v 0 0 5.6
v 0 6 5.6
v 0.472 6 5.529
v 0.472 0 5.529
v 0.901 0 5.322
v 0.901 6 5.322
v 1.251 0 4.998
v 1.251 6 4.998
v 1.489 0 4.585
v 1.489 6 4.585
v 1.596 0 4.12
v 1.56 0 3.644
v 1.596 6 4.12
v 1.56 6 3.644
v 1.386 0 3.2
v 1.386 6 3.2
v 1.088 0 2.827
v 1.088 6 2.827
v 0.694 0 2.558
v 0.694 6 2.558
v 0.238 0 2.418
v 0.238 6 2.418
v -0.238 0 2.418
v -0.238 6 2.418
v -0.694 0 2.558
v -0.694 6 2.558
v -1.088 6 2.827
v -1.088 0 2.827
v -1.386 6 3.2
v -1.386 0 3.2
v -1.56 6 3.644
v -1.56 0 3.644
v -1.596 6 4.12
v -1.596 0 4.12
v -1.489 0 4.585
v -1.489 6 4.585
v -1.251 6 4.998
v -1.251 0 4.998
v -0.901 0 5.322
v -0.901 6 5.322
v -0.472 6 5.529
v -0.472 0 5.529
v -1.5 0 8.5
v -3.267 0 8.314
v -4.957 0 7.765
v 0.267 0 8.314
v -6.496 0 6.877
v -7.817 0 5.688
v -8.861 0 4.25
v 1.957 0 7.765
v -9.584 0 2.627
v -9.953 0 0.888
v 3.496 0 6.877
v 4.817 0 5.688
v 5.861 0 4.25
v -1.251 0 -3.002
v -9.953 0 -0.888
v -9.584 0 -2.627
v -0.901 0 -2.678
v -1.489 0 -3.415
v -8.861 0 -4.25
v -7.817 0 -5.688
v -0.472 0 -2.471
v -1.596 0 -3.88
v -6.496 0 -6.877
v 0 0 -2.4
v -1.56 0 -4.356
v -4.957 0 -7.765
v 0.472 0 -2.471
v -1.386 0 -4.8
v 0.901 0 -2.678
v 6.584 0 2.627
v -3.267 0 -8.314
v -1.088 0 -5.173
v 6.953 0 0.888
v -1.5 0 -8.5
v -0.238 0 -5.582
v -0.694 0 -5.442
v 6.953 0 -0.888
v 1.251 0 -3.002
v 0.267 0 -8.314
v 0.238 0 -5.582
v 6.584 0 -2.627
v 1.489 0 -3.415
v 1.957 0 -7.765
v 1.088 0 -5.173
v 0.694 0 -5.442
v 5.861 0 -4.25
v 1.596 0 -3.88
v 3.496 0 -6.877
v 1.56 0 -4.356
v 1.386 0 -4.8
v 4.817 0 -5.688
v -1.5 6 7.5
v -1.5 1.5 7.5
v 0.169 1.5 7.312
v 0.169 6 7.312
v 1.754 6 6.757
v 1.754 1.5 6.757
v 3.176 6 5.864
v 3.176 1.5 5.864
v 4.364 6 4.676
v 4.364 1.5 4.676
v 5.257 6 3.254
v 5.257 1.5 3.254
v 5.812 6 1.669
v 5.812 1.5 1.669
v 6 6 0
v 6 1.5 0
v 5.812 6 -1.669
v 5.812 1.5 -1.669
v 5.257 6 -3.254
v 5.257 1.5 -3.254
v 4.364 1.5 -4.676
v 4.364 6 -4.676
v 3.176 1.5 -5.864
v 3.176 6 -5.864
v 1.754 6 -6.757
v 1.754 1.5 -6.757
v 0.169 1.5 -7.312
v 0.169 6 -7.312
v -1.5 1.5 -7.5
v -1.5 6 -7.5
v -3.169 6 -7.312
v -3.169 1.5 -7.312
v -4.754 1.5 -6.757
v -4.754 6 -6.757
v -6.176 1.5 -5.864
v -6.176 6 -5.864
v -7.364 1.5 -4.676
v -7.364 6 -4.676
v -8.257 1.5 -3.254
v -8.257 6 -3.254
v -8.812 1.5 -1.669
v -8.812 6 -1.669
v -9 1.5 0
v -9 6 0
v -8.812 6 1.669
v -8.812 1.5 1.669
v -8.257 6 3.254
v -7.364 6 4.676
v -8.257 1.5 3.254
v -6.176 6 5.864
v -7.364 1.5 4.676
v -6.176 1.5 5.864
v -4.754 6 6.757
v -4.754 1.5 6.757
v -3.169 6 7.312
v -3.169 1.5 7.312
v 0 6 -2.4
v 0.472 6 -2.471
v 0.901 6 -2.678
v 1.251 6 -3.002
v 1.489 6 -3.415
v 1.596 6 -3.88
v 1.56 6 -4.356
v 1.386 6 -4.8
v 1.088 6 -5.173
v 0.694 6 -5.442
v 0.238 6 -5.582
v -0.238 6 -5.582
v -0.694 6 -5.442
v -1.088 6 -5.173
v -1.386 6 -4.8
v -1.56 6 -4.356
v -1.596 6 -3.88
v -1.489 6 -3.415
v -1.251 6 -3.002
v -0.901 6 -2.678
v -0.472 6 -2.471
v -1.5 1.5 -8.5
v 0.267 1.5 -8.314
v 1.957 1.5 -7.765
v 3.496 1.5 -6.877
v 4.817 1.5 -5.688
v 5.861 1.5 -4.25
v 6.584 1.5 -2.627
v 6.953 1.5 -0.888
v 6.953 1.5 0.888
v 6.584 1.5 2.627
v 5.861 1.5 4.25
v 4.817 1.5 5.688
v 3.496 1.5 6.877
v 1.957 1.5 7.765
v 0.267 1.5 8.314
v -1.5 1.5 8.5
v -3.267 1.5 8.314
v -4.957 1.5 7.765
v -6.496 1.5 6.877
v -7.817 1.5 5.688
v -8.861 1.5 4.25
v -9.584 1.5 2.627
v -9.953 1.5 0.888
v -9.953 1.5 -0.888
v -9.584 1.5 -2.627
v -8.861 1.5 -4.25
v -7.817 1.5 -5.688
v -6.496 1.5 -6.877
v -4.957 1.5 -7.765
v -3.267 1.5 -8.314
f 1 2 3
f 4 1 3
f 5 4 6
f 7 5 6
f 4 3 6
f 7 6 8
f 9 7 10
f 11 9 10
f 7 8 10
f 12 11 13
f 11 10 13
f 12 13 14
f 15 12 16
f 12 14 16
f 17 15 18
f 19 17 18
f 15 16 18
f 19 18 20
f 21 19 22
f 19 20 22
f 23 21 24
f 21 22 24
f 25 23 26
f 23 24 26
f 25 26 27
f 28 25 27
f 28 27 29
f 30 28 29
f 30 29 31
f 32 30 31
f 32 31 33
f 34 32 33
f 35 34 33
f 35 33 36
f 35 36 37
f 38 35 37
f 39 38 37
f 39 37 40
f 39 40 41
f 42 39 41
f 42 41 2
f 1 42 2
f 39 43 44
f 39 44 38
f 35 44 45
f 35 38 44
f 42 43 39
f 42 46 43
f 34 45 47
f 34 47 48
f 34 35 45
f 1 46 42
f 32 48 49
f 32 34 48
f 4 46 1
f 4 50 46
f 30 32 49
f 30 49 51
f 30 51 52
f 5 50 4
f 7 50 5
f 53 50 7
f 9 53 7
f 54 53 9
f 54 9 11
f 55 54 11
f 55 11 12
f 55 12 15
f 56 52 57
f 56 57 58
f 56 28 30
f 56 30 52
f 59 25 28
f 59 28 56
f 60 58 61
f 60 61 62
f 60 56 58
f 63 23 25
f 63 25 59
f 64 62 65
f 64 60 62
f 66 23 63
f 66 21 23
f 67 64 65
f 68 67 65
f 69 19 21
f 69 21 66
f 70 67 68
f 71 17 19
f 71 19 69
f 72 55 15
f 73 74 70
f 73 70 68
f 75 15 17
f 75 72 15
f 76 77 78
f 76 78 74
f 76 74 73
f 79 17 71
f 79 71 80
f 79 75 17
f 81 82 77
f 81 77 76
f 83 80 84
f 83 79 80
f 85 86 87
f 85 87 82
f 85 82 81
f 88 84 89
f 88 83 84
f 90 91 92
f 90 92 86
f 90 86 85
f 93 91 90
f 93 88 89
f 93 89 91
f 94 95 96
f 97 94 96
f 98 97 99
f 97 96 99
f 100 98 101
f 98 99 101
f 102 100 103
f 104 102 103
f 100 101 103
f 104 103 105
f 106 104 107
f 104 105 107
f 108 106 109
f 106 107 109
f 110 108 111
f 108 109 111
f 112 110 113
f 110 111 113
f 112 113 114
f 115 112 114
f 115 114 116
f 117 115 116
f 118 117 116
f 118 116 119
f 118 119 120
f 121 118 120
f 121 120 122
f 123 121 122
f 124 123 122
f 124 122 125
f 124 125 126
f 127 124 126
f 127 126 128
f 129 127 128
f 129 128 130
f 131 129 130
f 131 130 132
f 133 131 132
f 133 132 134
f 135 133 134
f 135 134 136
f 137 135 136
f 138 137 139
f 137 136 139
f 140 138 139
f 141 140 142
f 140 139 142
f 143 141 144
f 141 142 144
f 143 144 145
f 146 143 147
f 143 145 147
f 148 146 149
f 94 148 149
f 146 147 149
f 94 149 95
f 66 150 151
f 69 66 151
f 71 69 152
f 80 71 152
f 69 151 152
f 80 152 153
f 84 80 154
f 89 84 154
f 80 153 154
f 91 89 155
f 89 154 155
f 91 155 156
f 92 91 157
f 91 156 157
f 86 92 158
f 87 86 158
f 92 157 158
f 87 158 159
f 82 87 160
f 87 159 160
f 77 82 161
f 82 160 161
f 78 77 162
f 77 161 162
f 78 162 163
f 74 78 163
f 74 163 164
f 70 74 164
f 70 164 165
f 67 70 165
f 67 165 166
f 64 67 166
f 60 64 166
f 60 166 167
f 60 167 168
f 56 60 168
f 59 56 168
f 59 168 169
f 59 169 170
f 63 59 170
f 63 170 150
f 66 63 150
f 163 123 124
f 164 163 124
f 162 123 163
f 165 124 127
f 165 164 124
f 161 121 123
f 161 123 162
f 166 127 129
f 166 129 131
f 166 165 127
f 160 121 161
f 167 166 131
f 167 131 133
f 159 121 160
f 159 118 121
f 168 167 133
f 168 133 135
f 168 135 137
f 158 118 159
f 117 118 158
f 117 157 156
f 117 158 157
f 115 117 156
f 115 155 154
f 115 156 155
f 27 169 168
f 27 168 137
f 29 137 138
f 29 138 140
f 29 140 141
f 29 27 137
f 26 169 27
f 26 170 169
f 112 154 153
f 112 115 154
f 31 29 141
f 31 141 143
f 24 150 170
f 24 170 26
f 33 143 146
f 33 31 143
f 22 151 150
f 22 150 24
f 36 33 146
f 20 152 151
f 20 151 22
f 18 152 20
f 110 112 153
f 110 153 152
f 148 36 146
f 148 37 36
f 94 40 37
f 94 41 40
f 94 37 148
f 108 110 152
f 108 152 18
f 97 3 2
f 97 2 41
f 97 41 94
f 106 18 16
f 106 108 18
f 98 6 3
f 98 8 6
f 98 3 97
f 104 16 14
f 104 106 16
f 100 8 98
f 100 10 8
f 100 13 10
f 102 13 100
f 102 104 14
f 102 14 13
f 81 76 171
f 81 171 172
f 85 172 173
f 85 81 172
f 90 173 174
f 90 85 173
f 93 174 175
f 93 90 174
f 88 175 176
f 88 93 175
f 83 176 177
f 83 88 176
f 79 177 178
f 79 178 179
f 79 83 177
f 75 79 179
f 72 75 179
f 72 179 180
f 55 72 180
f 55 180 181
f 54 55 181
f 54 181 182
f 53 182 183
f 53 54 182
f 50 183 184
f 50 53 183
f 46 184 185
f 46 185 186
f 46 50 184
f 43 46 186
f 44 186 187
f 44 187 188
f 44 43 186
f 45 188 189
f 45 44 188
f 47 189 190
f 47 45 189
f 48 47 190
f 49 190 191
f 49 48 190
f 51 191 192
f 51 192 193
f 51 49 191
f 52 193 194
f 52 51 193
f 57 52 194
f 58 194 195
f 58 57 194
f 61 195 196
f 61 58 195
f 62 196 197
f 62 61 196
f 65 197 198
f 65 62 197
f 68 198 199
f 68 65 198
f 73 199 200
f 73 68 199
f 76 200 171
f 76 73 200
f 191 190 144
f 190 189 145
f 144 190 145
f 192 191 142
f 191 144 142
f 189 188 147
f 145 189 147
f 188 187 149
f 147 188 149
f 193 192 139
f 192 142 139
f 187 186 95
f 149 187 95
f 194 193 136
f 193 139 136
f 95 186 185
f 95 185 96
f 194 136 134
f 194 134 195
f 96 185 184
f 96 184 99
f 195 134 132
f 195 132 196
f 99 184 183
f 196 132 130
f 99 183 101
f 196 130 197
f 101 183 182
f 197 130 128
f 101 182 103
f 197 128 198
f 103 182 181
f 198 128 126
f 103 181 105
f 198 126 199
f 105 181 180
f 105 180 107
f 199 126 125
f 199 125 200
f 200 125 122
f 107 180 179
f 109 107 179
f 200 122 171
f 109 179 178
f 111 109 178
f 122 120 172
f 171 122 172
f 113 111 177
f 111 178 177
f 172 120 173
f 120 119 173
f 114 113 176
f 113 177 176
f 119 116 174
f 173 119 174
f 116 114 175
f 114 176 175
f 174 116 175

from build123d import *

# Parameters (mm, degrees)
SKETCH1_R           = 7.5
BOSS_EXTRUDE1_DEPTH = 6
SKETCH2_R           = 8.5
BOSS_EXTRUDE2_DEPTH = 1.5
SKETCH4_R           = 1.6
CUT_EXTRUDE1_DEPTH  = 15.43086969


with BuildPart() as part:
    # Sketch1 → Boss-Extrude1 (new body)
    with BuildSketch(Plane(origin=(0, 0, 0), x_dir=(1, 0, 0), z_dir=(0, 1, 0))):
        with Locations(Location((-1.5, 0, 0), (0, 0, 270))):
            Circle(SKETCH1_R)
    extrude(amount=BOSS_EXTRUDE1_DEPTH)

    # Sketch2 → Boss-Extrude2 (add)
    with BuildSketch(Plane.XZ):
        with Locations(Location((-1.5, 0, 0), (0, 0, 270))):
            Circle(SKETCH2_R)
    extrude(amount=-BOSS_EXTRUDE2_DEPTH)

    # Sketch4 → Cut-Extrude1 (cut, through all)
    with BuildSketch(Plane(origin=(0, 6, 0), x_dir=(1, 0, 0), z_dir=(0, 1, 0))):
        with Locations(Location((0, 4, 0), (0, 0, 270))):
            Circle(SKETCH4_R)
        with Locations(Location((0, -4, 0), (0, 0, 270))):
            Circle(SKETCH4_R)
    extrude(amount=-CUT_EXTRUDE1_DEPTH, mode=Mode.SUBTRACT)


solid = part.part
